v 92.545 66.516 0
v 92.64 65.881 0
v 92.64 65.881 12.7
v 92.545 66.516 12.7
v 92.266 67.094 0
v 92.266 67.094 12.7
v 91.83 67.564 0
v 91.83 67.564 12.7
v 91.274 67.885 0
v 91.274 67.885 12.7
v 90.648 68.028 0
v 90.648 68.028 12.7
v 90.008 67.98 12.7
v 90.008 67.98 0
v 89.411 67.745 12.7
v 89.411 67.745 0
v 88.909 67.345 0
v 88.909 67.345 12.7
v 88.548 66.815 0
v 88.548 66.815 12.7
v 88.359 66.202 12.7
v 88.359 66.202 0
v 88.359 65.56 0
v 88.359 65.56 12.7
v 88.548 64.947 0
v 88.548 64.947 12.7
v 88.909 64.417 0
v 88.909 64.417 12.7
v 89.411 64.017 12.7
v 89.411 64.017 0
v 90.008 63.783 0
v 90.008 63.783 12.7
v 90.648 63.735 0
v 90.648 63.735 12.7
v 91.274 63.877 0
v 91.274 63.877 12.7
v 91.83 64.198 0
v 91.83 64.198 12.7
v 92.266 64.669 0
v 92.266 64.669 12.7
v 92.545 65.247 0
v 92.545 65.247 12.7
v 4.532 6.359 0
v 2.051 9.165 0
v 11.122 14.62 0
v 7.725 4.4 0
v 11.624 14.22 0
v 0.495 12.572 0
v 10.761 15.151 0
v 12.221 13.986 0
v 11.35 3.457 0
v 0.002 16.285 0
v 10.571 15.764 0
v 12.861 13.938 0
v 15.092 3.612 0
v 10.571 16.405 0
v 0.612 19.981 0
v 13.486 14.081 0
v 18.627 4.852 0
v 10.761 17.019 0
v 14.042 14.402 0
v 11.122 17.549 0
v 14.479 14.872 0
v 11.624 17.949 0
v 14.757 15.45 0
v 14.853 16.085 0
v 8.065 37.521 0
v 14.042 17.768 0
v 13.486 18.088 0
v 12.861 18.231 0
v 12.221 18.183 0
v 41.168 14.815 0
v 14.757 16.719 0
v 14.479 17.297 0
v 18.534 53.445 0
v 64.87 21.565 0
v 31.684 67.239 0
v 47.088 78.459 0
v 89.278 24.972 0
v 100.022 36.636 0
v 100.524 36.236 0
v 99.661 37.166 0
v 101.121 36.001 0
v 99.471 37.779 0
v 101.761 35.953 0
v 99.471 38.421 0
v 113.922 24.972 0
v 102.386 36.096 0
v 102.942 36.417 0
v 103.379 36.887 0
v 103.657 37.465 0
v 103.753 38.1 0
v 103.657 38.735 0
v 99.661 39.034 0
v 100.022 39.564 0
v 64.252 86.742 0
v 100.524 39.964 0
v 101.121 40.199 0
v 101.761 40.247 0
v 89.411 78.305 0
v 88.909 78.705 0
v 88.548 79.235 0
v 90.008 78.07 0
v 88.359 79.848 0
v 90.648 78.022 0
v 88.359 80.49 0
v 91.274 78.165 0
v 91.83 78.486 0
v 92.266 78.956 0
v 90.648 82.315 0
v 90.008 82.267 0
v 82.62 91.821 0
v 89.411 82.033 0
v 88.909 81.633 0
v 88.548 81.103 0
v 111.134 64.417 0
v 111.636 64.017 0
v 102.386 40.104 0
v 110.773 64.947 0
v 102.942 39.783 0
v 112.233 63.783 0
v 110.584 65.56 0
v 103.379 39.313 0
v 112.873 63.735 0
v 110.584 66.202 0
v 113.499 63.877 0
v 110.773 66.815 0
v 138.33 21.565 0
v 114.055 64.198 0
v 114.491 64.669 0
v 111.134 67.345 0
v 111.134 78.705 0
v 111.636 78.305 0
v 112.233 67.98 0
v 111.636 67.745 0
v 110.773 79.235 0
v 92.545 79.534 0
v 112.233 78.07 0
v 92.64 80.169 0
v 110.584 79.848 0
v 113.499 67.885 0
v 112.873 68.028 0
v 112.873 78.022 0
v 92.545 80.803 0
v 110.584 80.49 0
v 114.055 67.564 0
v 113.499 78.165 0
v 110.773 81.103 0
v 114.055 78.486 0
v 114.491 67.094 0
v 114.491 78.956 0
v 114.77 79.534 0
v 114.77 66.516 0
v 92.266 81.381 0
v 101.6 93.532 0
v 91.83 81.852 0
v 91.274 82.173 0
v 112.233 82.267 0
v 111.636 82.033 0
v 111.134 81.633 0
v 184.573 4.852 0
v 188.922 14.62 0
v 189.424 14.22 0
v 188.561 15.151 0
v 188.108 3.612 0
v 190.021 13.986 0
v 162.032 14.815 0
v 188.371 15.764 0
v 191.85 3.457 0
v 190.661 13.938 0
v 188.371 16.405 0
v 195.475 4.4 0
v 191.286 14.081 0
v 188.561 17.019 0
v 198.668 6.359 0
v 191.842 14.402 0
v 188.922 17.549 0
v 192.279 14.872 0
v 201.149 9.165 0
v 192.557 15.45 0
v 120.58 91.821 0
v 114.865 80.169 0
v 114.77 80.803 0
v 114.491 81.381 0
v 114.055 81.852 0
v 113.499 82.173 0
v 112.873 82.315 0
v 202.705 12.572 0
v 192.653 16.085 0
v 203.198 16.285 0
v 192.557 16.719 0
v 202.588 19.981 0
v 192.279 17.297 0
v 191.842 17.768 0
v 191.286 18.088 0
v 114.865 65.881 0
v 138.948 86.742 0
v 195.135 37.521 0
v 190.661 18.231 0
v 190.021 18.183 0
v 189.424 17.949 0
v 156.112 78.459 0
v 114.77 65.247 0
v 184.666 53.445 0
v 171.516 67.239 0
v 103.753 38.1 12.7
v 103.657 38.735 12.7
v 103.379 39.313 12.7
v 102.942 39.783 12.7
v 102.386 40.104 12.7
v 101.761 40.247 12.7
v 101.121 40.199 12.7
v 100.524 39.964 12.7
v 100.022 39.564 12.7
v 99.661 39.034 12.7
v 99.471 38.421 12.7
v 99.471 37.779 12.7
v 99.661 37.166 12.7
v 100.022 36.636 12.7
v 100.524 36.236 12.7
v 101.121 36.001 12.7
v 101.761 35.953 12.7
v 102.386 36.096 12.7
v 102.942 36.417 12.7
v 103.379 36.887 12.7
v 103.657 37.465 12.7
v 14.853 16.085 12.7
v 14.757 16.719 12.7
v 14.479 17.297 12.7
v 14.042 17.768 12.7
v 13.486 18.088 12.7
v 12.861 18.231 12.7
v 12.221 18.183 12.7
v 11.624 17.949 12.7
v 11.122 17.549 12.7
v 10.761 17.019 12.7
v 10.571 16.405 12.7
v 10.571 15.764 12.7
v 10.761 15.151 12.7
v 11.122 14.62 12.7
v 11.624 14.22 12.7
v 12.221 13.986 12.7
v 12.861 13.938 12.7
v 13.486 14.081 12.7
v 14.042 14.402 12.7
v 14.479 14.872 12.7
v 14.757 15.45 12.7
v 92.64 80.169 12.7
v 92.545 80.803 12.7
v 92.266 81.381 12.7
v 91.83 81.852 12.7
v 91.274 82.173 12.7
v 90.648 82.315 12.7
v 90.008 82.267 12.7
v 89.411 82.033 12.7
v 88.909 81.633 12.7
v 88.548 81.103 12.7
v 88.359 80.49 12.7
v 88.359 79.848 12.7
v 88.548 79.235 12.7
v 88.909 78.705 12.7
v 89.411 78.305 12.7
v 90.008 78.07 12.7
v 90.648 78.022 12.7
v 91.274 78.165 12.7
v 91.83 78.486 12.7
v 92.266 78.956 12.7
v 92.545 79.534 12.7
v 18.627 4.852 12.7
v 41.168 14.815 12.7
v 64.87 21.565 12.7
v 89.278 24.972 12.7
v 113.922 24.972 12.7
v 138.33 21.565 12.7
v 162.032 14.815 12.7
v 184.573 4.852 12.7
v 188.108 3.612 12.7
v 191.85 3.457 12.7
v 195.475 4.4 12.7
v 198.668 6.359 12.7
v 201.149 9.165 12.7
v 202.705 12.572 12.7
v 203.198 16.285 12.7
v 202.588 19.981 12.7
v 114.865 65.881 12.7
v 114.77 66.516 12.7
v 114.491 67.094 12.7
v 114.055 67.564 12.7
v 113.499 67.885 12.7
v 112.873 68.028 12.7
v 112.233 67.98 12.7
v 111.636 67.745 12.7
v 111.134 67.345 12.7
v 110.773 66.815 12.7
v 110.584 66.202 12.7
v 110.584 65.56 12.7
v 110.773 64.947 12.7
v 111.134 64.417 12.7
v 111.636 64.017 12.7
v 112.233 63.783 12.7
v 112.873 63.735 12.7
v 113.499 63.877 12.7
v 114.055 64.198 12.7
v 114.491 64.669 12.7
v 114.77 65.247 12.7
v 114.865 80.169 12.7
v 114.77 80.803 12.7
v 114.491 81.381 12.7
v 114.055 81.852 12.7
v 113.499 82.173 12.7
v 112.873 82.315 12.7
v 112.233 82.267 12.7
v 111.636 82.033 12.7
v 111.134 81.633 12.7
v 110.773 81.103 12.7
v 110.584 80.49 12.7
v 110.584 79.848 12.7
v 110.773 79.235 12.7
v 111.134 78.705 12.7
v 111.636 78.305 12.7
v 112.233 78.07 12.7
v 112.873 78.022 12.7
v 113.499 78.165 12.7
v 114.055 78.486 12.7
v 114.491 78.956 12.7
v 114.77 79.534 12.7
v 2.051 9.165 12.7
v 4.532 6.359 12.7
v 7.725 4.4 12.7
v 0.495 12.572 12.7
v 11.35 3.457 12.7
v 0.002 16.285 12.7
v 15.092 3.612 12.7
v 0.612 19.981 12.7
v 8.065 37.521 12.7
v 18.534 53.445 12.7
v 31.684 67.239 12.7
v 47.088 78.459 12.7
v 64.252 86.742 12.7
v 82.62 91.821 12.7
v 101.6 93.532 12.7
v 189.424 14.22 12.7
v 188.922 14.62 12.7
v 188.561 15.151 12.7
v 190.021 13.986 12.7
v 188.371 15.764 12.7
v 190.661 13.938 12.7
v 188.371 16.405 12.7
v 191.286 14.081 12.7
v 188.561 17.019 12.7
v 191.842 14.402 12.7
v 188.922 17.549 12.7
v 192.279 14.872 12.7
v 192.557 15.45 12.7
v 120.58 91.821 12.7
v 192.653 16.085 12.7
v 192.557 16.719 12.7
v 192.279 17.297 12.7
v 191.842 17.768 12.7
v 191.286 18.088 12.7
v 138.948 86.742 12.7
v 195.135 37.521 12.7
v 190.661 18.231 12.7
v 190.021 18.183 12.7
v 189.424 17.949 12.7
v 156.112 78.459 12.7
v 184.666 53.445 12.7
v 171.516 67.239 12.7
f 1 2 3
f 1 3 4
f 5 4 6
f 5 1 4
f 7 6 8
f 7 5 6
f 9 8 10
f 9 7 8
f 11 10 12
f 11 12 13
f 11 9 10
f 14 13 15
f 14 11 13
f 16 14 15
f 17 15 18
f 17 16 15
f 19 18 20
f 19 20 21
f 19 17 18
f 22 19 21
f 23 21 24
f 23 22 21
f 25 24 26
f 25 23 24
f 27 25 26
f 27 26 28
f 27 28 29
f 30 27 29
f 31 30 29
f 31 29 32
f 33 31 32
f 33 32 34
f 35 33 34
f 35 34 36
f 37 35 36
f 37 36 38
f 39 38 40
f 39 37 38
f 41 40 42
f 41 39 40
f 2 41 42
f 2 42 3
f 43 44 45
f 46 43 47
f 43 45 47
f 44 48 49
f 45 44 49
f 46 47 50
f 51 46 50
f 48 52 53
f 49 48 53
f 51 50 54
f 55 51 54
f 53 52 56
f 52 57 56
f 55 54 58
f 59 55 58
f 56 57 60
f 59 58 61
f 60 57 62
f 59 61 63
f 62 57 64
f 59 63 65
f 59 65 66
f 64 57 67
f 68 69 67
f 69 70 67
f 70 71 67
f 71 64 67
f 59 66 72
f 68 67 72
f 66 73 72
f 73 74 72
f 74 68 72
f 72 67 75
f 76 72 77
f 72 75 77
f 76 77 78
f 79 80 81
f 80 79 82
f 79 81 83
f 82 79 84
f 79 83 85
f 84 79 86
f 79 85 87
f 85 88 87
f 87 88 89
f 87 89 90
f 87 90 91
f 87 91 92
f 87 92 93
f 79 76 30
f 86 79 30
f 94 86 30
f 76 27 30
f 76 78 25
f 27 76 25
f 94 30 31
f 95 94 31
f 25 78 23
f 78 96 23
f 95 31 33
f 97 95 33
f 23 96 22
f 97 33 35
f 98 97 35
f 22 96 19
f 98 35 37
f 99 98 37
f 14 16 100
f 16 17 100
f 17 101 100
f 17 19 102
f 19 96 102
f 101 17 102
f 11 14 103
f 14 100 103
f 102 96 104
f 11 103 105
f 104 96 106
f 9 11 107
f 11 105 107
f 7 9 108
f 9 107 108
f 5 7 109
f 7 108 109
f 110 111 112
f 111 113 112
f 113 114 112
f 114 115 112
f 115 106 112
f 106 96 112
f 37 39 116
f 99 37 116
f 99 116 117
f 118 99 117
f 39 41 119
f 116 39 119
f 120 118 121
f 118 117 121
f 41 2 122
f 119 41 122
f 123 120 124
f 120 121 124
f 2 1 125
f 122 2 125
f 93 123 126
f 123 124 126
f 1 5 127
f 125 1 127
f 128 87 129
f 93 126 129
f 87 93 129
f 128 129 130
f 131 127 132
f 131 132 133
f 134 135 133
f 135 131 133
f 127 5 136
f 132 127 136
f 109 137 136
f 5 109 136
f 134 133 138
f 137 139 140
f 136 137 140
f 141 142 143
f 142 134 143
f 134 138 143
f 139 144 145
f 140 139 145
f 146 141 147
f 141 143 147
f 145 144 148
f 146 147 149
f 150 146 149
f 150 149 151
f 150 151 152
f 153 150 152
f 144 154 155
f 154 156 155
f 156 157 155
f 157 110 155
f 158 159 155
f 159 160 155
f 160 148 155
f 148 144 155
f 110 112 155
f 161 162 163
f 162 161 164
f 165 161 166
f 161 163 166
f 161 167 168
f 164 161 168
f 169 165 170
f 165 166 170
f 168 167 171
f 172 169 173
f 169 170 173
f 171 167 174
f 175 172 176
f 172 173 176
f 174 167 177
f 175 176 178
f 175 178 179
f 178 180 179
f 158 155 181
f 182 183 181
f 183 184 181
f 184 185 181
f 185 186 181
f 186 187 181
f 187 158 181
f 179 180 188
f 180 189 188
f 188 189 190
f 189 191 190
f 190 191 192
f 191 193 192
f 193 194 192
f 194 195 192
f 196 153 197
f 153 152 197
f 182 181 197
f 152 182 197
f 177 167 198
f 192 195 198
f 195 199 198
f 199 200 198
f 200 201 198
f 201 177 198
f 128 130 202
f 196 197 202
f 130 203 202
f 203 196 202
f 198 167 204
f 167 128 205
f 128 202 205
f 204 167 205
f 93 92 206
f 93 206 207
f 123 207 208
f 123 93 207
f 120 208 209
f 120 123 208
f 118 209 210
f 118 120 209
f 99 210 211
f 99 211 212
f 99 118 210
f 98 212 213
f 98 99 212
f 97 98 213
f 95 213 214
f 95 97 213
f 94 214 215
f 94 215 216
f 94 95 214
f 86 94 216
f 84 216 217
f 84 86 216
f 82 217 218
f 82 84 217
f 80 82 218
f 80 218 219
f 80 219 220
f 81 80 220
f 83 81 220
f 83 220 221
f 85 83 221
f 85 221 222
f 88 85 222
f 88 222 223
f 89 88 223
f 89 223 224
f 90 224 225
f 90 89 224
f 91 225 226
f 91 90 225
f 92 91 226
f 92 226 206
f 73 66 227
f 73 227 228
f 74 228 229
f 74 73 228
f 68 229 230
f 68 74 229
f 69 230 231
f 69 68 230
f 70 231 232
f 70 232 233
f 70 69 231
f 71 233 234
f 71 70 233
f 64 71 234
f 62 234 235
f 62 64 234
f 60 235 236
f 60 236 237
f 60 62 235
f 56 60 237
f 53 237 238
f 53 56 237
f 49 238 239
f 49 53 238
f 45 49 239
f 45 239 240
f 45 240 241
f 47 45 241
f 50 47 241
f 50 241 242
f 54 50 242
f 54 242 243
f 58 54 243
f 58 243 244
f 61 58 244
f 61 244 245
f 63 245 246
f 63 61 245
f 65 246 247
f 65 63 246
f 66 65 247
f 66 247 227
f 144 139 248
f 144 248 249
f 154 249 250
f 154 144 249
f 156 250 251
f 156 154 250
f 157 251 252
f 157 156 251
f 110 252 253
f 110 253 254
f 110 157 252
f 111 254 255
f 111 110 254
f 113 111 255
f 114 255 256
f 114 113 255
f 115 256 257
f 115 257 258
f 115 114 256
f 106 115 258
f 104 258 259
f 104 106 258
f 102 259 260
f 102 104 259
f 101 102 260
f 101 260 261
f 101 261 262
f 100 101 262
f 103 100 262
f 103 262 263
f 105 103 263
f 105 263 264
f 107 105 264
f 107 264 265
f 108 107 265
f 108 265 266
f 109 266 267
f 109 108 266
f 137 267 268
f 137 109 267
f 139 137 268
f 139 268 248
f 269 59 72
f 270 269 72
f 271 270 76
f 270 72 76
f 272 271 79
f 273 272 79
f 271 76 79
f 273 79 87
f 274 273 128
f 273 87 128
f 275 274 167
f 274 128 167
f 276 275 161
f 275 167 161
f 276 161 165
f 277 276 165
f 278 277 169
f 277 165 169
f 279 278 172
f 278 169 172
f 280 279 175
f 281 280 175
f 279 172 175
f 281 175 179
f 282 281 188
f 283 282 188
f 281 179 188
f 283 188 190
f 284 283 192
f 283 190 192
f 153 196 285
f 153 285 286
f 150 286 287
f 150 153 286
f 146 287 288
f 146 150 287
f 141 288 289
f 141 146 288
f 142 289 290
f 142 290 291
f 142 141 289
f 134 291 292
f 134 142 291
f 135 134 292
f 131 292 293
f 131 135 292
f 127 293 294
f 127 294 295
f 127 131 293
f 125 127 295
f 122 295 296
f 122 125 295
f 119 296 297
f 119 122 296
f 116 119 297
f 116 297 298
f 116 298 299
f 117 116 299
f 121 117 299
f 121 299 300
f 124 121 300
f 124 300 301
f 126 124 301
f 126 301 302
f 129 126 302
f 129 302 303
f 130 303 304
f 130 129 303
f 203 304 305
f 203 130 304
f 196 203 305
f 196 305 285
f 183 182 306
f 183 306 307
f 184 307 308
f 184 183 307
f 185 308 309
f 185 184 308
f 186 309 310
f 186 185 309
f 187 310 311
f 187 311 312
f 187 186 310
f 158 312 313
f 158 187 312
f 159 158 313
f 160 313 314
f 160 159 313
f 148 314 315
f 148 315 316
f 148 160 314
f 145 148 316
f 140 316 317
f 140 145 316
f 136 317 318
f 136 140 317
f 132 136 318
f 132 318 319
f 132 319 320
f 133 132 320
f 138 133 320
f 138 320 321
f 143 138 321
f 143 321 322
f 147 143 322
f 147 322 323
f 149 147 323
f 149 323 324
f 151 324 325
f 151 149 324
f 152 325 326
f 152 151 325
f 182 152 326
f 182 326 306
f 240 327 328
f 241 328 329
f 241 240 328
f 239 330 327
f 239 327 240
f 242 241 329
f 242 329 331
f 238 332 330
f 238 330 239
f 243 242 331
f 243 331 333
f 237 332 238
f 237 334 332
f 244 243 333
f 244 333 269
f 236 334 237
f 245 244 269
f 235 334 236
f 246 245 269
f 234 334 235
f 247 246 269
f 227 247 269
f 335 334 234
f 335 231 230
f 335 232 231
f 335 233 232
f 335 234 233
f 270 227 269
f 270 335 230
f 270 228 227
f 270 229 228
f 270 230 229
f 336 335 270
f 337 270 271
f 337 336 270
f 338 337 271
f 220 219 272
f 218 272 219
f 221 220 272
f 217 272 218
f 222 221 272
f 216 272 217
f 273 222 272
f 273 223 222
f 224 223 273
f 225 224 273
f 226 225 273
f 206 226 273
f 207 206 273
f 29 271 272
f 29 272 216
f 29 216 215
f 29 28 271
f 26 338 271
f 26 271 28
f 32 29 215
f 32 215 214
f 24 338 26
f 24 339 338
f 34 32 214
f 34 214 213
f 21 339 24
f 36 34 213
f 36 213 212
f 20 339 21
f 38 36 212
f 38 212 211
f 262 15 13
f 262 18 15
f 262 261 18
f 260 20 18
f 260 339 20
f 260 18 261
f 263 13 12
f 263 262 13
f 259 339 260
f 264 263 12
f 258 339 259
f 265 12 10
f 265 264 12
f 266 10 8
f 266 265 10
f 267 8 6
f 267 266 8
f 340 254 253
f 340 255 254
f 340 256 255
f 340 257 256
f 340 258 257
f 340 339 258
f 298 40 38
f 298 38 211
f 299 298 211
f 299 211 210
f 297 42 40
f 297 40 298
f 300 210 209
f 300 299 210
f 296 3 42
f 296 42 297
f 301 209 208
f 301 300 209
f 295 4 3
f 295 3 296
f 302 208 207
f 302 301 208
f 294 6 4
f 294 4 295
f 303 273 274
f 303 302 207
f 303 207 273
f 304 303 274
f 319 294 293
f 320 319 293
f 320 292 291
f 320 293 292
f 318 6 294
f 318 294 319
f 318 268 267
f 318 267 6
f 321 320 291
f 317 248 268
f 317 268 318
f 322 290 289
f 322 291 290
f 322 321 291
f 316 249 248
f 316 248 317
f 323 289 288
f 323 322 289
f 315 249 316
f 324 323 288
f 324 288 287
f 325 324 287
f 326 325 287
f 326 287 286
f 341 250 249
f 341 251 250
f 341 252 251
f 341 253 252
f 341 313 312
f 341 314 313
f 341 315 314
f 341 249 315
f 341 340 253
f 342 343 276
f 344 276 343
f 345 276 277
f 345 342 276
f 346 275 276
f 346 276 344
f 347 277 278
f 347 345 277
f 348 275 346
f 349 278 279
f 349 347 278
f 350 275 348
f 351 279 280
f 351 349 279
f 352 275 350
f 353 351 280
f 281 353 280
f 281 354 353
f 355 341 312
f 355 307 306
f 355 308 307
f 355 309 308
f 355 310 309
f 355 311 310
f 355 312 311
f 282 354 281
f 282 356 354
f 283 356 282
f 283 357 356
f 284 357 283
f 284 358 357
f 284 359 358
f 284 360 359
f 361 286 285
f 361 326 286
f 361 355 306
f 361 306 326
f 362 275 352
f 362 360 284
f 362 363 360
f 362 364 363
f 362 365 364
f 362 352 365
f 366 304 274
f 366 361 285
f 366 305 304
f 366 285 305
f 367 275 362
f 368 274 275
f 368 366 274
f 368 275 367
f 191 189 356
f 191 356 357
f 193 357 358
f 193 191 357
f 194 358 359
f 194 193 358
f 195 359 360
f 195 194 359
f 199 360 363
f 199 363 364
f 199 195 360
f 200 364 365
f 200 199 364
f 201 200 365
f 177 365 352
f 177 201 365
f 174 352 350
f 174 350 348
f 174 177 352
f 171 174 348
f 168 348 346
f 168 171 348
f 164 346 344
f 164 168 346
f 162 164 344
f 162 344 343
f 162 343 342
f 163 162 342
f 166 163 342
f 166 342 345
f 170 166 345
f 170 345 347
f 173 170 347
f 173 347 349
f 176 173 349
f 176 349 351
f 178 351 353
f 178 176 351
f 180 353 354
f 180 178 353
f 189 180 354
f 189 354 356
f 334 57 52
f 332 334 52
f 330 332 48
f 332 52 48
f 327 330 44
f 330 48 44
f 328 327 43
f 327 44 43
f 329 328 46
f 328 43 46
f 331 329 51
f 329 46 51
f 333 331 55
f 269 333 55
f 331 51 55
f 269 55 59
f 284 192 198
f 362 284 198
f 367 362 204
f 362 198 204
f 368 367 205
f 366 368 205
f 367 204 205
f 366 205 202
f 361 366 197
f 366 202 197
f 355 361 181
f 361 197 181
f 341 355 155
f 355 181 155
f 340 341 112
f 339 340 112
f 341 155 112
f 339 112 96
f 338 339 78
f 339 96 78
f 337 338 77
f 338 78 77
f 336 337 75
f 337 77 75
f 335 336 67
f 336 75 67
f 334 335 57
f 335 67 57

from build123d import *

# Parameters (mm, degrees)
F0_R     = 2.15265
F1_DEPTH = 12.7


with BuildPart() as f1:
    # F0 (on Top) → F1 (new body)
    with BuildSketch(Plane.XY):
        with BuildLine():
            ThreePointArc((18.626667, 4.852237), (101.6, 25.4), (184.573333, 4.852237))
            ThreePointArc((184.573333, 4.852237), (198.667536, 6.359245), (202.587506, 19.980973))
            ThreePointArc((202.587506, 19.980973), (101.6, 93.532141), (0.612494, 19.980973))
            ThreePointArc((0.612494, 19.980973), (4.532464, 6.359245), (18.626667, 4.852237))
        make_face()
        with Locations((12.7, 16.084539)):
            Circle(F0_R, mode=Mode.SUBTRACT)
        with Locations((101.6, 38.1)):
            Circle(F0_R, mode=Mode.SUBTRACT)
        with Locations((190.5, 16.084539)):
            Circle(F0_R, mode=Mode.SUBTRACT)
        with Locations((90.4875, 65.88125)):
            Circle(F0_R, mode=Mode.SUBTRACT)
        with Locations((90.4875, 80.16875)):
            Circle(F0_R, mode=Mode.SUBTRACT)
        with Locations((112.7125, 65.88125)):
            Circle(F0_R, mode=Mode.SUBTRACT)
        with Locations((112.7125, 80.16875)):
            Circle(F0_R, mode=Mode.SUBTRACT)
    extrude(amount=F1_DEPTH)


solid = f1.part
